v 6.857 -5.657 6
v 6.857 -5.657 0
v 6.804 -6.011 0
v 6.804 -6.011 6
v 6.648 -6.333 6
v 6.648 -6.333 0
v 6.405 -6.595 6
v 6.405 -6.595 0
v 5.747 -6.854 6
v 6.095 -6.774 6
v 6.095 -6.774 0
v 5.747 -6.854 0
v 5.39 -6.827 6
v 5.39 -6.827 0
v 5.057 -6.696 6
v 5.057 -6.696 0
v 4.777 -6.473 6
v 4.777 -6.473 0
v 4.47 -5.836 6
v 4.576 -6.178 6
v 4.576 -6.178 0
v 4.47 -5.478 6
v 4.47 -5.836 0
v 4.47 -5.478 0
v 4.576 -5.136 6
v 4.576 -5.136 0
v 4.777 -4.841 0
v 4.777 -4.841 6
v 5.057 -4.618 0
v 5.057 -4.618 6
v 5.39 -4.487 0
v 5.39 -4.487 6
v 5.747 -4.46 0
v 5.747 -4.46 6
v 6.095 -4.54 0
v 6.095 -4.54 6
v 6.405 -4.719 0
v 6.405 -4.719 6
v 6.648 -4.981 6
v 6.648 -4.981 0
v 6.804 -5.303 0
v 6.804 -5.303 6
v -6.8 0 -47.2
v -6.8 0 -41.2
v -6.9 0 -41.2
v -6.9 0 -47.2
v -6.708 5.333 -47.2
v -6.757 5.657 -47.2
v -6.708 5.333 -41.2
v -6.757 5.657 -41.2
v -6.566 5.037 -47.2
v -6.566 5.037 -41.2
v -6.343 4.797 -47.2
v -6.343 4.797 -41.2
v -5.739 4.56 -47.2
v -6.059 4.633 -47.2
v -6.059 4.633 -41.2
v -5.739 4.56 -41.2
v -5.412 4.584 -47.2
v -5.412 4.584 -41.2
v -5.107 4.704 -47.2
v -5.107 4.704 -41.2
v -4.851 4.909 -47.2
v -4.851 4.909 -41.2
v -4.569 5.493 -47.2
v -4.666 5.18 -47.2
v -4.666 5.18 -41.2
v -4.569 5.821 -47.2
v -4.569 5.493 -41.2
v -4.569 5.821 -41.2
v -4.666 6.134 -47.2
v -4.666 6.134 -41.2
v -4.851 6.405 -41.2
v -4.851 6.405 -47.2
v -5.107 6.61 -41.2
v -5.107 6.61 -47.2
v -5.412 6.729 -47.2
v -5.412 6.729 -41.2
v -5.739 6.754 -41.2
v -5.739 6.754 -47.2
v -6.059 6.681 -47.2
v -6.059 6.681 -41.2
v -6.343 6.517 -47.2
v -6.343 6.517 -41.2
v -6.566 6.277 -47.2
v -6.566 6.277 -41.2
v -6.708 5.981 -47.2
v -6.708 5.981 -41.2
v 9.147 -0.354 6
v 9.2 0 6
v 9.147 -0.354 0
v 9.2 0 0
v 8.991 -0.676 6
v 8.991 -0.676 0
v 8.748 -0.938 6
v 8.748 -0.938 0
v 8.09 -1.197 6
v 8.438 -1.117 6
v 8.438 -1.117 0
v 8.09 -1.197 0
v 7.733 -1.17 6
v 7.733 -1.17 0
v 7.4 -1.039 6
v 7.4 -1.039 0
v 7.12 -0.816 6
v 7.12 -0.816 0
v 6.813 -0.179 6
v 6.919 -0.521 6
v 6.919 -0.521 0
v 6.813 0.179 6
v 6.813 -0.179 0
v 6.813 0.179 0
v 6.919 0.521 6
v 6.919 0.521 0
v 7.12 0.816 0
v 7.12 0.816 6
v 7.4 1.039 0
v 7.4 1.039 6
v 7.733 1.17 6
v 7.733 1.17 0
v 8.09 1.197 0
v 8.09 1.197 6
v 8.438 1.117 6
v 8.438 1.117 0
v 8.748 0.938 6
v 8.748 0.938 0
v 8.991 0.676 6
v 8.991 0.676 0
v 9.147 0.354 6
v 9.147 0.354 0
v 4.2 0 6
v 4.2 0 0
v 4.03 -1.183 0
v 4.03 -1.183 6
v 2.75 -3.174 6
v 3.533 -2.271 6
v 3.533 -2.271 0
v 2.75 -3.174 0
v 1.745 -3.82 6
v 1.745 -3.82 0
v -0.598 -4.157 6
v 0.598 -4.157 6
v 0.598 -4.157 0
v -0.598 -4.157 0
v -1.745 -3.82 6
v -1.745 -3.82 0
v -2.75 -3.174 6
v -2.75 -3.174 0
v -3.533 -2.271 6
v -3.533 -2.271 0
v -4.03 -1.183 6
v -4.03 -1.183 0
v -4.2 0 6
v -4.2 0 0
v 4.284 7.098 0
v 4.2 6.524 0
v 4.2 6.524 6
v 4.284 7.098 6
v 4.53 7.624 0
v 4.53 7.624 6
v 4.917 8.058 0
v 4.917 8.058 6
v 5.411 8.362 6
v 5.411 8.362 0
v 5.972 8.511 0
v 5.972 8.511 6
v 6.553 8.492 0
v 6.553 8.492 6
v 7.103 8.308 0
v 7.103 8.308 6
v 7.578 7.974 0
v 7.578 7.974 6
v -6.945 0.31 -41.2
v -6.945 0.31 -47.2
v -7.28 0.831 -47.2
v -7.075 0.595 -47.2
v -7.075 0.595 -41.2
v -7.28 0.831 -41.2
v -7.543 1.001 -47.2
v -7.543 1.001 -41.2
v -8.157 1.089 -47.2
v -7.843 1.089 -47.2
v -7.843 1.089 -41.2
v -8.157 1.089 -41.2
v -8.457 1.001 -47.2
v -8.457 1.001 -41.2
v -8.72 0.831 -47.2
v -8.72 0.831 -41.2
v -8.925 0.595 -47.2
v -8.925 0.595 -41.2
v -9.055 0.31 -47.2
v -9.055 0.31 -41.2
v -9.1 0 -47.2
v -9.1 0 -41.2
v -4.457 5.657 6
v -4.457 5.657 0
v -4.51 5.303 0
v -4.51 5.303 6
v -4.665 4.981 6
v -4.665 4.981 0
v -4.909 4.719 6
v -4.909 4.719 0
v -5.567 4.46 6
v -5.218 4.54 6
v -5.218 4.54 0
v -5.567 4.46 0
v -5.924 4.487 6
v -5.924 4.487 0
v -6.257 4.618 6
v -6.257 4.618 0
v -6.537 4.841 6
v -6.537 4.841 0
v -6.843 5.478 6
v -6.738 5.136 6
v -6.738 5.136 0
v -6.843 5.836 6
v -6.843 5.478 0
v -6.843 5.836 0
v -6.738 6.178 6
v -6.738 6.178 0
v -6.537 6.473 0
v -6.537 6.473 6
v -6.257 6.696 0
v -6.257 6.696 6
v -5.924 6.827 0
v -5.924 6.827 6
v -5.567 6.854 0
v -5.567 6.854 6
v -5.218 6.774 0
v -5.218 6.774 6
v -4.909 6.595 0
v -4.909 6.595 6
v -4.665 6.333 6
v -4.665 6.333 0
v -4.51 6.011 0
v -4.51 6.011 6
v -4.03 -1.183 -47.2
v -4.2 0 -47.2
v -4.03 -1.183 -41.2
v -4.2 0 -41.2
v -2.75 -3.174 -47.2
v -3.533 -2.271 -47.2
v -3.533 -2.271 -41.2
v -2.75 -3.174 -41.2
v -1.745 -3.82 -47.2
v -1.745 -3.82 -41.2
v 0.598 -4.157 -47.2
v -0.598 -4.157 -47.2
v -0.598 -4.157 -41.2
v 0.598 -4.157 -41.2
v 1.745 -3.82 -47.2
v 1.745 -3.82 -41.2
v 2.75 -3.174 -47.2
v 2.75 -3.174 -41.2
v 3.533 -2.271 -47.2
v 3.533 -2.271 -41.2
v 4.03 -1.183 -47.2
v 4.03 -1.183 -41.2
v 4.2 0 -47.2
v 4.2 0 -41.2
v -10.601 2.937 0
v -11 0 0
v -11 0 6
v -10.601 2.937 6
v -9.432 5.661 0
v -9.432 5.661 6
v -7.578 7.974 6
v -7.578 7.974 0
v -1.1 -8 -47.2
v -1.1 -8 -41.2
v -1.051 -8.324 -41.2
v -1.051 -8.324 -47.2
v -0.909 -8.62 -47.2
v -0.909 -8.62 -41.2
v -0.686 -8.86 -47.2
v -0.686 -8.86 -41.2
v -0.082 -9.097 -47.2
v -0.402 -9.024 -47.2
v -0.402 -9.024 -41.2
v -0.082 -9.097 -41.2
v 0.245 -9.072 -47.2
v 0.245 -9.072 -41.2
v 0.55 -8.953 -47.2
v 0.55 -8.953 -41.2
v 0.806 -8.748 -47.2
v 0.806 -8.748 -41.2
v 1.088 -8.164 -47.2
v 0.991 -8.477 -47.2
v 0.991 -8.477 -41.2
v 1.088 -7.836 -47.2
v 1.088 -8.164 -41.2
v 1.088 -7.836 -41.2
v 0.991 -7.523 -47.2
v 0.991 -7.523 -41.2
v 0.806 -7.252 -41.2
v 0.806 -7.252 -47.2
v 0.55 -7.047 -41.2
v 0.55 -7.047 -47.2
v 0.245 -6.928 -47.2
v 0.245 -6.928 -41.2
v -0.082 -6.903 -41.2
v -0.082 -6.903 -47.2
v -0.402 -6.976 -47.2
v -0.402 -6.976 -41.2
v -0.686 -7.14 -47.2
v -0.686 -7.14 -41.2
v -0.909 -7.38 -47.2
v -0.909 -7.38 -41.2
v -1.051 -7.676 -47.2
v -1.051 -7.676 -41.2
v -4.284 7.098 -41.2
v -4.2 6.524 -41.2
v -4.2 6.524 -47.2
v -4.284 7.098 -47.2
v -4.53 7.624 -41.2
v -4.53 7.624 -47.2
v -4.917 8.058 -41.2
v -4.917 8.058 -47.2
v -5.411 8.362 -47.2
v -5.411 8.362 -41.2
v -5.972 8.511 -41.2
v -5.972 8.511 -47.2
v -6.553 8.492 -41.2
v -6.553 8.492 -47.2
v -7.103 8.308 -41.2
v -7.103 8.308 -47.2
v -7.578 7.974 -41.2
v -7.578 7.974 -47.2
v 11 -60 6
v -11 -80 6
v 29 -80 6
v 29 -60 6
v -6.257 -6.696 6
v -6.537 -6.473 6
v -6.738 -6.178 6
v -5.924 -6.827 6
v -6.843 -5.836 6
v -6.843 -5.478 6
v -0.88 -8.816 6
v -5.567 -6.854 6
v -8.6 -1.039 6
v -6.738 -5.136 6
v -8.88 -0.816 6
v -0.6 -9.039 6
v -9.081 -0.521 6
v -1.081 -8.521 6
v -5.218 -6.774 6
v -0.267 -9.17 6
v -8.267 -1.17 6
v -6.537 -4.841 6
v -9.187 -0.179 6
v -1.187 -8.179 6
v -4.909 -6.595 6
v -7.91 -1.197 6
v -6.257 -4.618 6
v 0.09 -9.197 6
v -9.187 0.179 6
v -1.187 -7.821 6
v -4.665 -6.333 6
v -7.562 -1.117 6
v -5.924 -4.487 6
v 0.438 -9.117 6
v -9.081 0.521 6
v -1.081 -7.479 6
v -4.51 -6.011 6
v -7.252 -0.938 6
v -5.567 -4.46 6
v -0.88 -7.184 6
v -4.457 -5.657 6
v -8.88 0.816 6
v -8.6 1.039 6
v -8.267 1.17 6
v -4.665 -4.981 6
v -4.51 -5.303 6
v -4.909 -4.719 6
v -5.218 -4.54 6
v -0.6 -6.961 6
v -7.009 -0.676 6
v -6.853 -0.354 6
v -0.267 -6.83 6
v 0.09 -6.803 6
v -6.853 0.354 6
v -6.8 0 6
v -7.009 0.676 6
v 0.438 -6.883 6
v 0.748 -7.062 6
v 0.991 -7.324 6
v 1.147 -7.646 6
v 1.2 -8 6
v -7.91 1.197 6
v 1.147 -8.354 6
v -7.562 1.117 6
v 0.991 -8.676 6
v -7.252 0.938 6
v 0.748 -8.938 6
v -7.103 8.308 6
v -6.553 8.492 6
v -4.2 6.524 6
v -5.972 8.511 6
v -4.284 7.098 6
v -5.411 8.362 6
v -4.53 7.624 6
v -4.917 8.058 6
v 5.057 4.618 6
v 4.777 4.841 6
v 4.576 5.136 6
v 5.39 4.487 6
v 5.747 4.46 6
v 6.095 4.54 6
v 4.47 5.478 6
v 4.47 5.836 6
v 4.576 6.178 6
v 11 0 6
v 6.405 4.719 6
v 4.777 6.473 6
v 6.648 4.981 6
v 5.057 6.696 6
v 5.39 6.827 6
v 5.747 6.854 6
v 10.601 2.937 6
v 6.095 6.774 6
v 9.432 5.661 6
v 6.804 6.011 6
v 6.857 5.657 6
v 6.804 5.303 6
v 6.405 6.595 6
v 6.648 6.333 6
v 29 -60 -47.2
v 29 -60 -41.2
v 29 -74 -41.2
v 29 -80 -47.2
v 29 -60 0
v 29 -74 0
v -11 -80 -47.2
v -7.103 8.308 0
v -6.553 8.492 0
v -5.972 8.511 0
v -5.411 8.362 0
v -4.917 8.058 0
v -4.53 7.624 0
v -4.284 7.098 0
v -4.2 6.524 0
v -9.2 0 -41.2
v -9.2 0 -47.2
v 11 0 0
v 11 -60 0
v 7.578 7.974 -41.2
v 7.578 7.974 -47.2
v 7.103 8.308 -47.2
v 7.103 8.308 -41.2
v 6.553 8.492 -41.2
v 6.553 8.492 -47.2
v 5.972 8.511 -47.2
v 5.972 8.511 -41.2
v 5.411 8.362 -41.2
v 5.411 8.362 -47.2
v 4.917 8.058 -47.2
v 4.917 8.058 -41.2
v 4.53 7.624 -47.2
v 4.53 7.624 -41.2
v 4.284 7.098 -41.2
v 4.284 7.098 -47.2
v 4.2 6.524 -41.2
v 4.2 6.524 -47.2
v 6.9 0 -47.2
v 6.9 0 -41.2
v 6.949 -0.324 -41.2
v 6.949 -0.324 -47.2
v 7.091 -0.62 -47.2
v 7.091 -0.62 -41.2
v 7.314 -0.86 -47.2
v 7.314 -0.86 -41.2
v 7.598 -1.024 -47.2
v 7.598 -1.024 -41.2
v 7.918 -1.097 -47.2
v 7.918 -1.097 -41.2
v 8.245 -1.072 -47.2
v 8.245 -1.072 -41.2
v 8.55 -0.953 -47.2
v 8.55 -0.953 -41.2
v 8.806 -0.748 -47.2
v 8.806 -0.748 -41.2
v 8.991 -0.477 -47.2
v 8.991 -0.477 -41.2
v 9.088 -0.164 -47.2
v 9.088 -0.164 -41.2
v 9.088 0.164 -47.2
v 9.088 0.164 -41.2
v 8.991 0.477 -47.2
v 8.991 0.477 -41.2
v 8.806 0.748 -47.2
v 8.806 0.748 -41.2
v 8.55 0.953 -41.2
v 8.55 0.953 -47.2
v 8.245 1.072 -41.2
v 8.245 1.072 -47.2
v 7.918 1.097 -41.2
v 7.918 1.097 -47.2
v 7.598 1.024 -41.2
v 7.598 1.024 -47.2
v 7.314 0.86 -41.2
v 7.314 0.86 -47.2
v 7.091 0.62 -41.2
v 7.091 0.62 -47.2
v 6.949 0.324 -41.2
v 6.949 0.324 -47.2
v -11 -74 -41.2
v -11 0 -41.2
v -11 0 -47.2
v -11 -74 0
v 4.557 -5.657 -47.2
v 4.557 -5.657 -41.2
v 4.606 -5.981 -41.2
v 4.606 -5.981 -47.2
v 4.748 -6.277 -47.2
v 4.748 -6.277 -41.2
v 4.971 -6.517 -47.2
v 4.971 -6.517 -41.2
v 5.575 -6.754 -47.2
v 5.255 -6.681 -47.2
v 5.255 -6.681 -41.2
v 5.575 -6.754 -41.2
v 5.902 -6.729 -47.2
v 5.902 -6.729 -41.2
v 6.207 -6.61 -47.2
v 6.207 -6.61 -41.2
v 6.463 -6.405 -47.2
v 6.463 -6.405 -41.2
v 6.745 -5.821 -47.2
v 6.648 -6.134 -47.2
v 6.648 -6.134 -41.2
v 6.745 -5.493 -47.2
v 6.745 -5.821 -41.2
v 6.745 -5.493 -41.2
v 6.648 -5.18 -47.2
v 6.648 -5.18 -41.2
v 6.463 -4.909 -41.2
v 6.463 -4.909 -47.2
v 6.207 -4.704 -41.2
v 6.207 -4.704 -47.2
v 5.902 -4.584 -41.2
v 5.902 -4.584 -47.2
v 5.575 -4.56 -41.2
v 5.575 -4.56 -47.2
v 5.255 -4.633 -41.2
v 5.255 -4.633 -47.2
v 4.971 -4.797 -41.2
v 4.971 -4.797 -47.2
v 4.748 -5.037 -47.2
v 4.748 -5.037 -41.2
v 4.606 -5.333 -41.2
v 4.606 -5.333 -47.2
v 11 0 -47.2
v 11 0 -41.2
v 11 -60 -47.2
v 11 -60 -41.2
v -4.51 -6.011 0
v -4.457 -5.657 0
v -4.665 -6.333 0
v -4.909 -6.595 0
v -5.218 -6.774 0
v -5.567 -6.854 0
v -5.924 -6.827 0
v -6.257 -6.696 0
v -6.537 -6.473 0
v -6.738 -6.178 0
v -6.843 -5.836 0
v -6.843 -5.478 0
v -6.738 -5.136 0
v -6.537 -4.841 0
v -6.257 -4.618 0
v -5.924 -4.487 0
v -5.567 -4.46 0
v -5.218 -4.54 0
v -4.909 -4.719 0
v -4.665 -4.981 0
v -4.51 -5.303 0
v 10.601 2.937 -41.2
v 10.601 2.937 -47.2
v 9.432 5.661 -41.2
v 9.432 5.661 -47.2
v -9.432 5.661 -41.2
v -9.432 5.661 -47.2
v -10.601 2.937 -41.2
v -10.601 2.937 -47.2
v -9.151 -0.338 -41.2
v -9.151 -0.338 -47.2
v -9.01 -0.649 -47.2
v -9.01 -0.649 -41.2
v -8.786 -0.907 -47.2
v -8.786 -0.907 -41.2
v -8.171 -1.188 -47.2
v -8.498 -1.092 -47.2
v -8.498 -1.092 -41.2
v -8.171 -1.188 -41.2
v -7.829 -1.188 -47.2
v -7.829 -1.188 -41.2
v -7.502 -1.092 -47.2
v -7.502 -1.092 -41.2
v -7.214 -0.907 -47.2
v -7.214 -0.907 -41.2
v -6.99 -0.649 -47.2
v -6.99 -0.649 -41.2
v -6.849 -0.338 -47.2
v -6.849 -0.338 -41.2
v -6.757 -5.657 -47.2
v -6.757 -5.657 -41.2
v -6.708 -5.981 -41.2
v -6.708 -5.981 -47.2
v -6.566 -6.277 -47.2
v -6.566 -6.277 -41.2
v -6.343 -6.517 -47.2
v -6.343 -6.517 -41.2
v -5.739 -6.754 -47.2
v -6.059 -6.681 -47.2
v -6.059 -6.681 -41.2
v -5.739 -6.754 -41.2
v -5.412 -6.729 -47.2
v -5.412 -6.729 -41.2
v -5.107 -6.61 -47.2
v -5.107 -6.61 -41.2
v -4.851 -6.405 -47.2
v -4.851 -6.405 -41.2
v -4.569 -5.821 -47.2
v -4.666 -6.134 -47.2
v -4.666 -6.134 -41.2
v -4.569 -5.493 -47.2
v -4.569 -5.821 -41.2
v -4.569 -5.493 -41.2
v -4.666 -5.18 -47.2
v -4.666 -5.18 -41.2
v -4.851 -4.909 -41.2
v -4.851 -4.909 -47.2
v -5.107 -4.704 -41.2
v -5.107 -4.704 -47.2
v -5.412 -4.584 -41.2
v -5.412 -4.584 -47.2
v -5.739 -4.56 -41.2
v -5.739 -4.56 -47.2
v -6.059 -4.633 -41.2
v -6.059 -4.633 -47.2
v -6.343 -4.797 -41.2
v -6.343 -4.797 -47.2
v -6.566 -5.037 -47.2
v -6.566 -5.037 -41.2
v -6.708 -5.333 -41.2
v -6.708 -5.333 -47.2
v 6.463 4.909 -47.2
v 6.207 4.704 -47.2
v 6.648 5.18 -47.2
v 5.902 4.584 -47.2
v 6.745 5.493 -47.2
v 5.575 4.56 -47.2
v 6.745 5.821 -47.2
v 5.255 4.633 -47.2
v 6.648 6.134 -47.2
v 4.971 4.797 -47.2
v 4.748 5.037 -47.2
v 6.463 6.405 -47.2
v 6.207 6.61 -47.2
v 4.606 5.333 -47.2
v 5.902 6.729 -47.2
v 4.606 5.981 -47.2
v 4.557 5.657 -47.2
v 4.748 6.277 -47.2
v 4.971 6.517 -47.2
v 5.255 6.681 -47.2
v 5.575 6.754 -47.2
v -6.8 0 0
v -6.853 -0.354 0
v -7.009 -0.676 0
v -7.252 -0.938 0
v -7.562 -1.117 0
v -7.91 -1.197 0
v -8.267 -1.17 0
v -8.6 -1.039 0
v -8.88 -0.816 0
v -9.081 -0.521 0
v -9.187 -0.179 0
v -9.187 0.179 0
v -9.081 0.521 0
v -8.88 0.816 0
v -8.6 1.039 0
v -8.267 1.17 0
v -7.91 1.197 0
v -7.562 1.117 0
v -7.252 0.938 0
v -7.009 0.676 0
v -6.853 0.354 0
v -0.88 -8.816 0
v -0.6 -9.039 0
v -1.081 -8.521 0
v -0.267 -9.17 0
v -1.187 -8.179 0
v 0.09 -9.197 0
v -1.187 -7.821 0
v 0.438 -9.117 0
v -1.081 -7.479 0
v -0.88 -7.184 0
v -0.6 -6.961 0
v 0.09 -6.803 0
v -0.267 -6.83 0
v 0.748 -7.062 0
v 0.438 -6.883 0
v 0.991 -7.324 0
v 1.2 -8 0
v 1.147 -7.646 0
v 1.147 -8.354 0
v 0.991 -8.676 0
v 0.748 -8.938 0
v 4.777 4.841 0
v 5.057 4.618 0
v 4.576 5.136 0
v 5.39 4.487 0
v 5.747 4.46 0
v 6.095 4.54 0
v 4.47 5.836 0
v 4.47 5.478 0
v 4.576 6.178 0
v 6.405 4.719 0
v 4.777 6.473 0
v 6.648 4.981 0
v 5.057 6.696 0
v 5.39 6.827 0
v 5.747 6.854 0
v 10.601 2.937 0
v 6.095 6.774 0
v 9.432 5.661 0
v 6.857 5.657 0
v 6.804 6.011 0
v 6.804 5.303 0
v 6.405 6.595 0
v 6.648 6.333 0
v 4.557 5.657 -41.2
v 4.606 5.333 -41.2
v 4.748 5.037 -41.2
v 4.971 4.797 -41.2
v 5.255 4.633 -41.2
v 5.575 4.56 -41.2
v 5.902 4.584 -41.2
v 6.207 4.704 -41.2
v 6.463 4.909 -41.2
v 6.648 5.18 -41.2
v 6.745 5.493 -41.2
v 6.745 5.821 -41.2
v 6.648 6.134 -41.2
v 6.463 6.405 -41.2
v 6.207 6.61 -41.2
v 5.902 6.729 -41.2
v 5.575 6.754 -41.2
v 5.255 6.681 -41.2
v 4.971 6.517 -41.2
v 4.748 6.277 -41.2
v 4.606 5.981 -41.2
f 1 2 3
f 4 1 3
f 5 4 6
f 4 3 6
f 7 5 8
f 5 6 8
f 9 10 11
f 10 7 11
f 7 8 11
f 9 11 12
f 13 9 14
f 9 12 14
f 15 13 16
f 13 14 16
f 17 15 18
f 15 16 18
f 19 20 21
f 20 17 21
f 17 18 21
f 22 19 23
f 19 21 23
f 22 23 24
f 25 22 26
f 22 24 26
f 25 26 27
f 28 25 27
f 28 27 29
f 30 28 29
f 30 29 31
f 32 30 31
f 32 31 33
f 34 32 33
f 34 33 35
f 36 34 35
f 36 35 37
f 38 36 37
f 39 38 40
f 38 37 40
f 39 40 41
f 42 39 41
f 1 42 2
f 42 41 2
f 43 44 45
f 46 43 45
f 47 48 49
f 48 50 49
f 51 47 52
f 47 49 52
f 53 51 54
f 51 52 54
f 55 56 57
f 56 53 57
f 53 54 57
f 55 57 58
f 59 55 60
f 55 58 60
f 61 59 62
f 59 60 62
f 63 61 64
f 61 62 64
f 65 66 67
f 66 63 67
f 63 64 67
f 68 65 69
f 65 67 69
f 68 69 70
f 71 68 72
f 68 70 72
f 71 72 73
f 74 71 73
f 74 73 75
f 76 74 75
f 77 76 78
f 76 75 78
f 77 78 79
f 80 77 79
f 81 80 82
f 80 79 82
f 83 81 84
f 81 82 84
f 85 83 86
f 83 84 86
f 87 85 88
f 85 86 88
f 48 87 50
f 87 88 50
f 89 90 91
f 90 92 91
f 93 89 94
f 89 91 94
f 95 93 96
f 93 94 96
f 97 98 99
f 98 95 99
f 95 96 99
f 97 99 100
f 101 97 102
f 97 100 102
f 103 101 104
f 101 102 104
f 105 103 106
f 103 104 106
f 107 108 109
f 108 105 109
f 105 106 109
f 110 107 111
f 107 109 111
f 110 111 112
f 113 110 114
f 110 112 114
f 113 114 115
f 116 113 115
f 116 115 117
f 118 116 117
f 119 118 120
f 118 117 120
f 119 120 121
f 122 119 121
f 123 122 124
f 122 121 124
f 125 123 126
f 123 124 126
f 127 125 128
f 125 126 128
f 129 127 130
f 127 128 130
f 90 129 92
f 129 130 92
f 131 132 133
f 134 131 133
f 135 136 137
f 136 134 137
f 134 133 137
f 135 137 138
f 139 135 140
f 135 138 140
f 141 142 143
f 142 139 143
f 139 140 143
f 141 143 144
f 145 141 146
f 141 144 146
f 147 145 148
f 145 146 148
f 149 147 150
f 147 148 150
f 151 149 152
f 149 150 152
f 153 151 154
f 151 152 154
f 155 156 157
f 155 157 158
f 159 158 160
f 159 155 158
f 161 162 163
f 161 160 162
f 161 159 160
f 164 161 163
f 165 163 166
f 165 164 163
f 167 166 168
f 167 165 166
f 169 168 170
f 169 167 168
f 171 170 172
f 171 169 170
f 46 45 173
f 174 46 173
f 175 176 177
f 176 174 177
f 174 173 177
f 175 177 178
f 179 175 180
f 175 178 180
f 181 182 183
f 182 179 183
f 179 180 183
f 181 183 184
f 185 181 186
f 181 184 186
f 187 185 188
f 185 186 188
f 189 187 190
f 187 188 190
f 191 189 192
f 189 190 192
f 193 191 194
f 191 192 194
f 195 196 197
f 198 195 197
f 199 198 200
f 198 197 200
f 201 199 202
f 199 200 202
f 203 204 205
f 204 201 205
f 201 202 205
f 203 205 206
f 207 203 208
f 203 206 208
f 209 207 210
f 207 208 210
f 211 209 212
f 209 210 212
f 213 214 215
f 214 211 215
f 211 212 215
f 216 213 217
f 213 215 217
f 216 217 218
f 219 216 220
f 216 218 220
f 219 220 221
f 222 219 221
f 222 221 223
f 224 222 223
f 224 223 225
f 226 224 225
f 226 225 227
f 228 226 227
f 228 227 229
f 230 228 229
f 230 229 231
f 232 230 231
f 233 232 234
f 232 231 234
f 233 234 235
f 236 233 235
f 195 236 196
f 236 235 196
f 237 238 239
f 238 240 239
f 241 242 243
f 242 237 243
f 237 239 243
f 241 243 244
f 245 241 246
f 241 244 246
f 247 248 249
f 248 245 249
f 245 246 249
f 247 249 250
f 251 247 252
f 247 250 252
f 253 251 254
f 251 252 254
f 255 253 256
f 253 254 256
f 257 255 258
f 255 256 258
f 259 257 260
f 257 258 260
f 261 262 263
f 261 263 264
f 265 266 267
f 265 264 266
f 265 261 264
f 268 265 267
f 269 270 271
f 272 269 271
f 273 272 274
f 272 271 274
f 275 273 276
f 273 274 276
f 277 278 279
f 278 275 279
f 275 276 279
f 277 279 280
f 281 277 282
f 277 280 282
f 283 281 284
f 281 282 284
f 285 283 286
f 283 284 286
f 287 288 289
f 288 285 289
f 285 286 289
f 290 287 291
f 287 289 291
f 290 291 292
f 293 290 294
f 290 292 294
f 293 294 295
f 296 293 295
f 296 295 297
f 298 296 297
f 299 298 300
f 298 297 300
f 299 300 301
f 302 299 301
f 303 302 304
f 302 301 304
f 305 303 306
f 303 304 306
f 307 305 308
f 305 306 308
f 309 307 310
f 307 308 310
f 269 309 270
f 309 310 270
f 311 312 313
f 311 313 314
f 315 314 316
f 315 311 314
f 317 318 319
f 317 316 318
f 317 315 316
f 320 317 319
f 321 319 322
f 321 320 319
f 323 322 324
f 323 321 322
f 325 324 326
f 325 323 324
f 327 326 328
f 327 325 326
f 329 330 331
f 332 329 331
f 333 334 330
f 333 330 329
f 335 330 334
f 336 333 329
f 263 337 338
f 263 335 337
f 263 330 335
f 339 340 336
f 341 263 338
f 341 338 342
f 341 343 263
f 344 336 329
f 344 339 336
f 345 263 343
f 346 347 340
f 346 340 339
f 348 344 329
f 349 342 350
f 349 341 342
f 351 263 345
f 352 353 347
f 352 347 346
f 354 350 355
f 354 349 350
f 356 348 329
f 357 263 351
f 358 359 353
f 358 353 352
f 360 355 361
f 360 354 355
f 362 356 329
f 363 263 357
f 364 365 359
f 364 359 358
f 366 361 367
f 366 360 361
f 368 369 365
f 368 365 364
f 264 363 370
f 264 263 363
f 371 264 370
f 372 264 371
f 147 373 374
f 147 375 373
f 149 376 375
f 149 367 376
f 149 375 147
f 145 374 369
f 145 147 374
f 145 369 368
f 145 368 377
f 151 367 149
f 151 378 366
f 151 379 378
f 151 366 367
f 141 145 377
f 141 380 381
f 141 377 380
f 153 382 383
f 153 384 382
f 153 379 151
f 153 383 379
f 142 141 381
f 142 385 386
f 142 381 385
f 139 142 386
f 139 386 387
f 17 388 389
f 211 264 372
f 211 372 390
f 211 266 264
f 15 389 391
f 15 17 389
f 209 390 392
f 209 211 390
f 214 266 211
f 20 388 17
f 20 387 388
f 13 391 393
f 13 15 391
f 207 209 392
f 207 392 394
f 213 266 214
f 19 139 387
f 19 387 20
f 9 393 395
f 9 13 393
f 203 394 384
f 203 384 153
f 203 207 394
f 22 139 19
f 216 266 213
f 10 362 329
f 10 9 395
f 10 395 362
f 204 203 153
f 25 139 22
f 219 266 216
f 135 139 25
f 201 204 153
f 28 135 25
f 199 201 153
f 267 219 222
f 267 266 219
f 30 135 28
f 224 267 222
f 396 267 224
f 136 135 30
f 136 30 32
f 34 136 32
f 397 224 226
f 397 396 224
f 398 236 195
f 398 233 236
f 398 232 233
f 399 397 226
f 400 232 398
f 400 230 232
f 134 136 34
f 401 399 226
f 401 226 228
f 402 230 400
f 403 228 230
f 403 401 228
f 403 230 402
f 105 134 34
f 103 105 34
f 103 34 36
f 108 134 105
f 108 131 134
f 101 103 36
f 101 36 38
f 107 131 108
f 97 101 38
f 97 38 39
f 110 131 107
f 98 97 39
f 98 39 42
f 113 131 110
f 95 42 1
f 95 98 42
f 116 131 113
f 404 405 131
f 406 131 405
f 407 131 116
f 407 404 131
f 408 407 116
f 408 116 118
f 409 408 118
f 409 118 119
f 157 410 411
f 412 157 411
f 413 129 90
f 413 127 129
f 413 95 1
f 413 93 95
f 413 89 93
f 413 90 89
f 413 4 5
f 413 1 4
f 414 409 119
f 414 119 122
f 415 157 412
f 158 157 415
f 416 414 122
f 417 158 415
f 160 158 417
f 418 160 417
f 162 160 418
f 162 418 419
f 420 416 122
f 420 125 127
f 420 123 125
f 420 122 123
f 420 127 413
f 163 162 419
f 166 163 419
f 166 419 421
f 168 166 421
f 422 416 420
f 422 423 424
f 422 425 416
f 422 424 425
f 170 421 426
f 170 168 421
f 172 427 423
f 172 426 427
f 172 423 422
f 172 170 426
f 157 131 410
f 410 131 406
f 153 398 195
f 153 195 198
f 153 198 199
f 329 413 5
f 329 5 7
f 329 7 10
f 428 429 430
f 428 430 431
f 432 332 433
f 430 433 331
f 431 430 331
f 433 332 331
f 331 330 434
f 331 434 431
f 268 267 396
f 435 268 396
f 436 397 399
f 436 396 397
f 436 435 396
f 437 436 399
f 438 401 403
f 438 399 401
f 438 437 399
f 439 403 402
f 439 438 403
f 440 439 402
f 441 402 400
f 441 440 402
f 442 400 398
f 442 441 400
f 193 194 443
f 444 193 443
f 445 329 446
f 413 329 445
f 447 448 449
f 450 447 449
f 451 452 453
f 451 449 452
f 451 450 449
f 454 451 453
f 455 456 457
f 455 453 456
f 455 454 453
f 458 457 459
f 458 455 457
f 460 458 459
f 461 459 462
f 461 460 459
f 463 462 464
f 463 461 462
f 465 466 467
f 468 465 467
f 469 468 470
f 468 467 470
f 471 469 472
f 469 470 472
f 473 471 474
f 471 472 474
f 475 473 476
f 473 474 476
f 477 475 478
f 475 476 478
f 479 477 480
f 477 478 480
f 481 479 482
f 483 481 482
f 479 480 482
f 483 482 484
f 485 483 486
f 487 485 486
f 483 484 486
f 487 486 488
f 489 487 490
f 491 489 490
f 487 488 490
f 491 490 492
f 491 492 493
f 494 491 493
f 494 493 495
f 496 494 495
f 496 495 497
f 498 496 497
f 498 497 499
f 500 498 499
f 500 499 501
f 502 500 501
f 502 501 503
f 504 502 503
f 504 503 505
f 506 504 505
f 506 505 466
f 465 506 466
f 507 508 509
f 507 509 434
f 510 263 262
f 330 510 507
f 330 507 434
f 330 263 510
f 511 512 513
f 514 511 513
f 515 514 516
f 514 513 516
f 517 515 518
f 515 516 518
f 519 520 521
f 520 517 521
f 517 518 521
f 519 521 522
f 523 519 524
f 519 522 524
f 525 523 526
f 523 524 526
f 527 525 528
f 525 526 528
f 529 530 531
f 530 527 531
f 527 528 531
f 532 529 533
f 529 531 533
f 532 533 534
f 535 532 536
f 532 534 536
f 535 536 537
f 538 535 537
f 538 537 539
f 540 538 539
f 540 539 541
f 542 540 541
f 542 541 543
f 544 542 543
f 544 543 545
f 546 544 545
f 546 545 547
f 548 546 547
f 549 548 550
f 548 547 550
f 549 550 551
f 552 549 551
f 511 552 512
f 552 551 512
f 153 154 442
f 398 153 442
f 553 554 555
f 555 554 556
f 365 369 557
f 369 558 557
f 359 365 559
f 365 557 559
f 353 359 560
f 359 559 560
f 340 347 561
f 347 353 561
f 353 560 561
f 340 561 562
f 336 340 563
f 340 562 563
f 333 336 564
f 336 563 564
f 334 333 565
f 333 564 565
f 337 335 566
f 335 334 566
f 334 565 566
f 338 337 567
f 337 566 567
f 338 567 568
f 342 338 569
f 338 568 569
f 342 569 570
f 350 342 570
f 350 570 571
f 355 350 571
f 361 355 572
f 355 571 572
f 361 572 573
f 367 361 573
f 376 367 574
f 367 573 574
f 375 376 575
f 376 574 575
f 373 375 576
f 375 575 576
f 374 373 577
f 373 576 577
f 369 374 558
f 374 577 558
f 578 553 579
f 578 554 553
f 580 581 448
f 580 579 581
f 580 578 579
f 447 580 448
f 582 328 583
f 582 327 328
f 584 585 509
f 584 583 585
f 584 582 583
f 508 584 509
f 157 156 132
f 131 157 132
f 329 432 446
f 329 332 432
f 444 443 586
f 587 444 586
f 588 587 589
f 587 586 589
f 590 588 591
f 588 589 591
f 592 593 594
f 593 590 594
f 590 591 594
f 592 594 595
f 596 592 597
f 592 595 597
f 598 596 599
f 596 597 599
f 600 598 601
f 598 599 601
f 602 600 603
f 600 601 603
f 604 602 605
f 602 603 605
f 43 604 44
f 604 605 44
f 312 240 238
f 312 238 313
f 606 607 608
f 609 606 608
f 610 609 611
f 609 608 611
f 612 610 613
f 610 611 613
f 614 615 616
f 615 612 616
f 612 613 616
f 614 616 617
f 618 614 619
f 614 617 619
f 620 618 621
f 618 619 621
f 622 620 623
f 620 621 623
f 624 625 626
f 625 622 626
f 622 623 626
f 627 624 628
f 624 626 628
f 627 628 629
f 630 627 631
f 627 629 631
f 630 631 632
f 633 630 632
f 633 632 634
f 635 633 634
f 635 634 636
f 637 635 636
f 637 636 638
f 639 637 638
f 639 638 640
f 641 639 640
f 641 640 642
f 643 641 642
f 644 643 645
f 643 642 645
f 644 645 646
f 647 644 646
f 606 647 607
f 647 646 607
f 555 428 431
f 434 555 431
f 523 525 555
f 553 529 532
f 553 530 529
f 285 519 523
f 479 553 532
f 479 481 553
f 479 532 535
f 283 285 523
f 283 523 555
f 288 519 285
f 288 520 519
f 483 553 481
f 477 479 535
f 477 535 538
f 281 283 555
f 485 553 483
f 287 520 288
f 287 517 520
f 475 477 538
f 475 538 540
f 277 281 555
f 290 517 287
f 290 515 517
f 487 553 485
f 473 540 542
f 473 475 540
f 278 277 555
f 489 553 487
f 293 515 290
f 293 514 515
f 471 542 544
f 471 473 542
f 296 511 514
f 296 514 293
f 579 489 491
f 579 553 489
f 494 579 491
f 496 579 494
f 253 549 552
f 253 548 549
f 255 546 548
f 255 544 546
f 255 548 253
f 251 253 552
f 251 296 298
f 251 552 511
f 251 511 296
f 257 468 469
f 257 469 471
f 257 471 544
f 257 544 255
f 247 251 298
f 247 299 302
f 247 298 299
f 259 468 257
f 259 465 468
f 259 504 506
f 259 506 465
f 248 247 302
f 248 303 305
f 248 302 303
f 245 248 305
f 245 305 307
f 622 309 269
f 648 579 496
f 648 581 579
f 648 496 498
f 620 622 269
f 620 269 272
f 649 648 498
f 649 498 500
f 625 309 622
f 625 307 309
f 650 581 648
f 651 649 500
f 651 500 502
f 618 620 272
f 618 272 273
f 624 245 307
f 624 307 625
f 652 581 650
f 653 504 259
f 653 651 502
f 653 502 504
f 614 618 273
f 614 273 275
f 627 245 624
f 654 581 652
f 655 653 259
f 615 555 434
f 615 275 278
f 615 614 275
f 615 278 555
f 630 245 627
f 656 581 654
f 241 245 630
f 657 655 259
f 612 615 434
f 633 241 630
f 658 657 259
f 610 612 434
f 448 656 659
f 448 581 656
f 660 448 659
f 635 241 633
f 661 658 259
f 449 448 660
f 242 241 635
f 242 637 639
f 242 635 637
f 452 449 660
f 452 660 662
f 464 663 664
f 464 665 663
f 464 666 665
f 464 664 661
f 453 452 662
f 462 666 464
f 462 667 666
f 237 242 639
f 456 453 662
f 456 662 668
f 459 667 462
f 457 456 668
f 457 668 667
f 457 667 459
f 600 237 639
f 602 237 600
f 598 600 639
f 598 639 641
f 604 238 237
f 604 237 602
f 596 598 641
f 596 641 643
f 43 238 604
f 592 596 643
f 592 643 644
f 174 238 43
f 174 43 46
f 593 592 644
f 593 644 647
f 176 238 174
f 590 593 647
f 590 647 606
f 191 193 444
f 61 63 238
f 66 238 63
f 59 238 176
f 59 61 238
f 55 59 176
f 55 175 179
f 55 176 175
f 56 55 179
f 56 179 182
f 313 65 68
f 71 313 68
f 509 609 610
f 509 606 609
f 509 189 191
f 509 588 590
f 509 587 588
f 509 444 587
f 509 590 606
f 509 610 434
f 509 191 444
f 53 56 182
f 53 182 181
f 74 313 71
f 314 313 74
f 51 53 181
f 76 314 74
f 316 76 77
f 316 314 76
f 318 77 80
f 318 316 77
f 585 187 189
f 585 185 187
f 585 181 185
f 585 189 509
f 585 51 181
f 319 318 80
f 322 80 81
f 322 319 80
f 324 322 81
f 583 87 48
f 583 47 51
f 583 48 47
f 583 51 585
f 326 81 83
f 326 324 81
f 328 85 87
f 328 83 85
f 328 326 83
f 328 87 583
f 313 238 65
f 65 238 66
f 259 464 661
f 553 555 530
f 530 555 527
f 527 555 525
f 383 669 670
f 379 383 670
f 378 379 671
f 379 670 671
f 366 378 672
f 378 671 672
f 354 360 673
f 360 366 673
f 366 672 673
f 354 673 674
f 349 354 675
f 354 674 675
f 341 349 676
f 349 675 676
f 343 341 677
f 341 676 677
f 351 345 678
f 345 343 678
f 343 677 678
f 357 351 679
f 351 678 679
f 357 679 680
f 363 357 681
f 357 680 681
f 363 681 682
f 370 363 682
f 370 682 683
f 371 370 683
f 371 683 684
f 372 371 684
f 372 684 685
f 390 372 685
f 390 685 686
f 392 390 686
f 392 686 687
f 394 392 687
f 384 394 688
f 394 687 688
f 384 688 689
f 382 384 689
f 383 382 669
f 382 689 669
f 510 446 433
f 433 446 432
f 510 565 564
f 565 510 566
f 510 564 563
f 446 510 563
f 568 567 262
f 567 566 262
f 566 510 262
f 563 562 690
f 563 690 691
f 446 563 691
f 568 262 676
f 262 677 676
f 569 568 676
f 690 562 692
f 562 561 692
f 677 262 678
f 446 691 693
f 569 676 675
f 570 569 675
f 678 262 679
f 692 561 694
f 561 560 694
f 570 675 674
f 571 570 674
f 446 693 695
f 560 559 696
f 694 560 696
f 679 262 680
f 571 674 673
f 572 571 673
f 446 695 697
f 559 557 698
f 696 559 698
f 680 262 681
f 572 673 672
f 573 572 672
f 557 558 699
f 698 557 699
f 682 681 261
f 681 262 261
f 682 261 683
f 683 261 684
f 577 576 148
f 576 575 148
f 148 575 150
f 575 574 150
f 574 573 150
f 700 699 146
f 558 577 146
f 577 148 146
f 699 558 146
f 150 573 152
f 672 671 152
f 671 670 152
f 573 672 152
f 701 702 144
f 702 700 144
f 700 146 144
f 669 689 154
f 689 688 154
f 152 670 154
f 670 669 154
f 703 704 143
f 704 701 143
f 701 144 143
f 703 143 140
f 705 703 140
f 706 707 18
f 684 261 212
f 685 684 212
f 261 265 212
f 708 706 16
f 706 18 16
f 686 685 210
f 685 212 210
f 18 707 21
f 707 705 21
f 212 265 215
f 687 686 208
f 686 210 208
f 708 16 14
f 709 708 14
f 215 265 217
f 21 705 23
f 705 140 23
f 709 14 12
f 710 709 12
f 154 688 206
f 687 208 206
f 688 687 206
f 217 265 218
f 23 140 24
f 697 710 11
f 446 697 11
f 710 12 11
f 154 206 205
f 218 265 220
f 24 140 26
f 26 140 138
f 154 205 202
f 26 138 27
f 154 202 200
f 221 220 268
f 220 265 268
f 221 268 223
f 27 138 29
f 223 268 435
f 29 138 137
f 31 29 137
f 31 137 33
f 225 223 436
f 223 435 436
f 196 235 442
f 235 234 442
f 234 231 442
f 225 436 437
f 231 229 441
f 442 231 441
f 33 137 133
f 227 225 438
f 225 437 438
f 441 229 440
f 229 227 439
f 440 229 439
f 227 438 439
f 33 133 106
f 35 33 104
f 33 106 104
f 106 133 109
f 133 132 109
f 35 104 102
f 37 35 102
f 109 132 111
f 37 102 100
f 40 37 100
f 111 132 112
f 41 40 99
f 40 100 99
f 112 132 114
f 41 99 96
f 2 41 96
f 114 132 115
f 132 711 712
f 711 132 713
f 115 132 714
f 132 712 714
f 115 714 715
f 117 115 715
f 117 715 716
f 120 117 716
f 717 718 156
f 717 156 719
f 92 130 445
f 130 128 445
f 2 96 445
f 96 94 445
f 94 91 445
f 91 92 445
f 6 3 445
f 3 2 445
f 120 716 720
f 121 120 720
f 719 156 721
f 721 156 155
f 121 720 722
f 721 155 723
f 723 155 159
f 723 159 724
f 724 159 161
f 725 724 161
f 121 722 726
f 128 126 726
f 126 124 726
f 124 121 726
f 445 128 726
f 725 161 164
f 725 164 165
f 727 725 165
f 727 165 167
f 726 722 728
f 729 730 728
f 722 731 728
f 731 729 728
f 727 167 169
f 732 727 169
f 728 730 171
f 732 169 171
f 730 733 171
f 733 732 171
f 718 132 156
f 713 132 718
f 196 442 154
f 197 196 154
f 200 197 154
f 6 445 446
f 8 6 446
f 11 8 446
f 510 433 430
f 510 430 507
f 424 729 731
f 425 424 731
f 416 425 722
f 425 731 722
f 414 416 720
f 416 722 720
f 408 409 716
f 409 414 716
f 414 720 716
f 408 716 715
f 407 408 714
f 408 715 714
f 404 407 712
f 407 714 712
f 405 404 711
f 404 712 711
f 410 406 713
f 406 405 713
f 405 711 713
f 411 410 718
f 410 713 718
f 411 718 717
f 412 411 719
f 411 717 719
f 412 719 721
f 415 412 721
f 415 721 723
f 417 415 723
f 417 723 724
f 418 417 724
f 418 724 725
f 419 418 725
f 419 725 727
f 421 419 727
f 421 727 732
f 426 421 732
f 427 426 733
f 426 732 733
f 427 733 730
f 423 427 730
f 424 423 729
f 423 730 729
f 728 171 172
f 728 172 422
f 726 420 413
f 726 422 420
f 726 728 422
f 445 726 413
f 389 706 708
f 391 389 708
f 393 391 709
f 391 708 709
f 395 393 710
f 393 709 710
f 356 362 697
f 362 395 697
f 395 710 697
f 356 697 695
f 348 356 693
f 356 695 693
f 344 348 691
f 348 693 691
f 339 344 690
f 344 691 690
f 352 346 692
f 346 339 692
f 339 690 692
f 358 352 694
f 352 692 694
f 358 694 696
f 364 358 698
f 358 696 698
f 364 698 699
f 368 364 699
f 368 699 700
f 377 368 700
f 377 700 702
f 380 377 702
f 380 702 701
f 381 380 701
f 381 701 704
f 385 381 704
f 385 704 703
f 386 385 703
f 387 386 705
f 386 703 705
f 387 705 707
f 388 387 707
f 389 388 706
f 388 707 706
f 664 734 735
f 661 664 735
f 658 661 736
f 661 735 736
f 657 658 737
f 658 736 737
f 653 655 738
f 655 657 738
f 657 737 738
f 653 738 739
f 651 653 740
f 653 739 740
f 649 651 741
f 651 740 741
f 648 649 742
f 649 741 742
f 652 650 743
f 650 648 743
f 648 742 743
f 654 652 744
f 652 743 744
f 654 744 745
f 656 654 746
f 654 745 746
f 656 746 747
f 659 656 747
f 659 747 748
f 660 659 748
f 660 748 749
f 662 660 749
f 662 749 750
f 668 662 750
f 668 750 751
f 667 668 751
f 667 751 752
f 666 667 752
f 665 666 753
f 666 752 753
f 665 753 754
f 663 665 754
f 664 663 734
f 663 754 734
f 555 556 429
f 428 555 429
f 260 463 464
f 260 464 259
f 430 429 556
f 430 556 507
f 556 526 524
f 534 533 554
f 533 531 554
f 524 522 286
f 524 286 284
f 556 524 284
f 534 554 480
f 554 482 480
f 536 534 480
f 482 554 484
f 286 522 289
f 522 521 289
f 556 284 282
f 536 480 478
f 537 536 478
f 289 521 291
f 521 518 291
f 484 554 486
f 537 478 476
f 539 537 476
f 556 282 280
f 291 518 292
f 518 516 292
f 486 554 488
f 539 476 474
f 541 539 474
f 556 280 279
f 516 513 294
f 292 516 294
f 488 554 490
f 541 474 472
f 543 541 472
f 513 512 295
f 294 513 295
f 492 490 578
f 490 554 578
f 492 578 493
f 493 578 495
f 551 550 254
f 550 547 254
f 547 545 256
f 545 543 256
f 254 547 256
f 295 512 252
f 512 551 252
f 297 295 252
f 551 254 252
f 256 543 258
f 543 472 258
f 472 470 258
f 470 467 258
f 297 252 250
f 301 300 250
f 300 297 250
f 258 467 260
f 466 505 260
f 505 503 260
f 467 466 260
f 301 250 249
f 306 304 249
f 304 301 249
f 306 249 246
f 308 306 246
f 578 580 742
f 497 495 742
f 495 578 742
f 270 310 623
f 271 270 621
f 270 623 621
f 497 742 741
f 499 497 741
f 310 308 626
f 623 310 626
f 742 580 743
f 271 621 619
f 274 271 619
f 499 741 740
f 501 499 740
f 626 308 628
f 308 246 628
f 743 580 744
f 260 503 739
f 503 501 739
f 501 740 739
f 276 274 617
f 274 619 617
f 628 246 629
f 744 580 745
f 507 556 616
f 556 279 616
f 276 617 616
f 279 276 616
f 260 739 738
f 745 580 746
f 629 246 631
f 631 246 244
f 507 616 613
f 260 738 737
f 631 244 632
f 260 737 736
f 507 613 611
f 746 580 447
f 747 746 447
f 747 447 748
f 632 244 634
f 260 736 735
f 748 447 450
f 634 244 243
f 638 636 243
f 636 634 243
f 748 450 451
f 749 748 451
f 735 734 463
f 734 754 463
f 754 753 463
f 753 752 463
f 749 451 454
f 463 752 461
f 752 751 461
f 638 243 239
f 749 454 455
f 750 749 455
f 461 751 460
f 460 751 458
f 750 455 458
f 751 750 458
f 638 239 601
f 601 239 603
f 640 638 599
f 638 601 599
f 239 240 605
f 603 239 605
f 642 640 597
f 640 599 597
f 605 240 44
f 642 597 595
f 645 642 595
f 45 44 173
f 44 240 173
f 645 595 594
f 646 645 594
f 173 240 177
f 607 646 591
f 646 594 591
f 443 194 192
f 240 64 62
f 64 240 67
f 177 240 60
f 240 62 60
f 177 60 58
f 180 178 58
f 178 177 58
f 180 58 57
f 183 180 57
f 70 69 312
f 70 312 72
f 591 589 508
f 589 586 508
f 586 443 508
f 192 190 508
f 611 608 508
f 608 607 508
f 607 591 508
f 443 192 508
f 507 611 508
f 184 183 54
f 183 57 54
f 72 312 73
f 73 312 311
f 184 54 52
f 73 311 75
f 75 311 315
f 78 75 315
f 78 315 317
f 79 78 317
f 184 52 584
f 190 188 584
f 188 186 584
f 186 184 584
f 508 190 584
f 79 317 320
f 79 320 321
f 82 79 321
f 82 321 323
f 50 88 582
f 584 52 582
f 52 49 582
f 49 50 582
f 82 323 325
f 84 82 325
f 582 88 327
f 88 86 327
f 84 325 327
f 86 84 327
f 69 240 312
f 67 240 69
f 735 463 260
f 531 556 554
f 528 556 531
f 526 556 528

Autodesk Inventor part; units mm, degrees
ref_plane "YZ Plane" through (0, 0, 0) normal (1, 0, 0) x (0, 1, 0)
ref_plane "XZ Plane" through (0, 0, 0) normal (0, 1, 0) x (-1, 0, 0)
ref_plane "XY Plane" through (0, 0, 0) normal (0, 0, 1) x (1, 0, 0)
sketch "스케치1" plane through (0, 0, 0) normal (0, 0, 1) x (1, 0, 0)
  circle A0 centre (0, 8) radius 1.05 projected
  line L0 (6.1695, 0) -> (-5.6569, 0)
  circle A1 centre (0, 0) radius 11 projected
  line L1 (11, -20) -> (31, -20) projected
  line L2 (11, 0) -> (11, -20) projected
  arc A2 (11, 0) -> (7.5778, 7.9735) centre (0, 0) ccw projected
  arc A3 (-7.5778, 7.9735) -> (-11, 0) centre (0, 0) ccw projected
  line L3 (-11, -40) -> (-11, 0) projected
  line L4 (31, -40) -> (-11, -40) projected
  line L5 (31, -20) -> (31, -40) projected
  circle A4 centre (5.6569, 5.6569) radius 1.2 projected
  circle A5 centre (-8, 0) radius 1.2 projected
  circle A6 centre (-5.6569, 5.6569) radius 1.2 projected
  circle A7 centre (-5.6569, -5.6569) radius 1.2 projected
  circle A8 centre (5.6569, -5.6569) radius 1.2 projected
  circle A9 centre (0, -8) radius 1.2 projected
  circle A10 centre (8, 0) radius 1.2 projected
  arc A11 (-10.0222, 4.5338) -> (10.0222, 4.5338) centre (0, 0) ccw
  arc A12 (-4.2, 0) -> (4.2, 0) centre (0, 0) ccw
  line L6 (4.2, 0) -> (-4.2, 0)
  line L7 (-4.2, 0) -> (-4.2, 6.5238)
  line L8 (-4.2, 13.5959) -> (4.2, 13.5959)
  line L9 (4.2, 6.5238) -> (4.2, 0)
  arc A13 (-7.5778, 7.9735) -> (7.5778, 7.9735) centre (0, 0) ccw
  arc A14 (7.5778, 7.9735) -> (4.2, 6.5238) centre (6.2, 6.5238) ccw
  arc A15 (-4.2, 6.5238) -> (-7.5778, 7.9735) centre (-6.2, 6.5238) ccw
  point P0 (-6.2, 0)
  point P1 (4.2, 10.1666)
  point P2 (-4.2, 10.1666)
  point P3 (-7.5778, 7.9735)
  point P4 (7.5778, 7.9735)
  dimension "d20" = 2
extrude "돌출1" add sketch "스케치1" along normal blind 6 contours L9 A14 A1 A15 L7 A12
sketch "스케치3" plane through (0, 0, 6) normal (0, 0, 1) x (1, 0, 0)
  line L0 (31, -40) -> (31, -20) projected
  line L1 (11, -20) -> (31, -20)
  line L2 (31, -20) -> (31, -40)
  line L3 (31, -40) -> (11, -40)
  line L4 (11, -40) -> (11, -20)
  arc A0 (-7.5778, 7.9735) -> (7.5778, 7.9735) centre (0, 0) ccw projected
  circle A1 centre (-8, 0) radius 1.2 projected
  circle A2 centre (-5.6569, -5.6569) radius 1.2 projected
  circle A3 centre (5.6569, -5.6569) radius 1.2 projected
  circle A4 centre (0, -8) radius 1.2 projected
  circle A5 centre (8, 0) radius 1.2 projected
  line L5 (11, -40) -> (-11, -40)
  line L6 (-11, -40) -> (-11, -80)
  line L7 (-11, -80) -> (11, -80)
  line L8 (11, -80) -> (11, -40)
  line L9 (-11, -80) -> (29, -80)
  line L10 (29, -80) -> (29, -60)
  line L11 (29, -60) -> (-11, -60)
  line L12 (-11, -60) -> (-11, -80)
  line L13 (-11, -40) -> (11, -40)
  line L14 (11, -40) -> (11, 0)
  line L15 (11, 0) -> (-11, 0)
  line L16 (-11, 0) -> (-11, -40)
  arc A6 (7.5778, 7.9735) -> (4.2, 6.5238) centre (6.2, 6.5238) ccw projected
  line L17 (4.2, 6.5238) -> (4.2, 0) projected
  arc A7 (-4.2, 0) -> (4.2, 0) centre (0, 0) ccw projected
  line L18 (-4.2, 0) -> (-4.2, 6.5238) projected
  arc A8 (-4.2, 6.5238) -> (-7.5778, 7.9735) centre (-6.2, 6.5238) ccw projected
  point P0 (11, -60)
  dimension "d4" = 40
extrude "돌출2" add sketch "스케치3" against normal blind 6 contours L5 L16 A0 L14 L4 | L8 L11 L6 L5 | L11 L10 L9 L8 | L8 L7 L6 L11
sketch "스케치4" plane through (0, 0, 0) normal (0, 0, -1) x (-1, 0, 0)
  line L0 (11, 0) -> (11, -80) projected
  line L1 (-29, -60) -> (-29, -80) projected
  line L2 (11, -80) -> (-29, -80)
  line L3 (-29, -80) -> (-29, -60)
  line L4 (-29, -60) -> (11, -60)
  line L5 (11, -60) -> (11, -80)
  line L6 (11, -80) -> (-29, -80)
  line L7 (-29, -80) -> (-29, -74)
  line L8 (-29, -74) -> (11, -74)
  line L9 (11, -74) -> (11, -80)
  point P0 (0, 0)
  dimension "d7" = 6
extrude "돌출3" add sketch "스케치4" along normal blind 41.2 contours L0 L2 L1 L8
sketch "스케치5" plane through (0, 0, -41.2) normal (0, 0, -1) x (-1, 0, 0)
  circle A0 centre (0, 0) radius 11 projected
  circle A1 centre (5.6569, -5.6569) radius 1.15
  circle A2 centre (8, 0) radius 1.15
  circle A3 centre (5.6569, 5.6569) radius 1.15
  circle A4 centre (0, 8) radius 1.15
  circle A5 centre (-5.6569, 5.6569) radius 1.15
  circle A6 centre (-8, 0) radius 1.15
  circle A7 centre (-5.6569, -5.6569) radius 1.15
  circle A8 centre (0, -8) radius 1.15
  line L0 (-11, 0) -> (-11, -60) projected
  line L1 (11, 0) -> (11, -80) projected
  line L2 (-11, 0) -> (11, 0)
  line L3 (11, 0) -> (11, -80)
  line L4 (11, -80) -> (-11, -80)
  line L5 (-11, -80) -> (-11, 0)
  line L6 (-29, -80) -> (-29, -60) projected
  line L7 (-29, -80) -> (-11, -80)
  line L8 (-11, -80) -> (-11, -60)
  line L9 (-11, -60) -> (-29, -60)
  line L10 (-29, -60) -> (-29, -80)
  line L11 (6.2, 0) -> (-6.2, 0)
  line L12 (-6.2, 15) -> (6.2, 15)
  arc A9 (-10.0222, 4.5338) -> (10.0222, 4.5338) centre (0, 0) ccw
  arc A10 (11, 0) -> (7.5778, 7.9735) centre (0, 0) ccw projected
  line L13 (11, 0) -> (11, -80) projected
  line L14 (11, -80) -> (-29, -80) projected
  line L15 (-29, -80) -> (-29, -60) projected
  line L16 (-29, -60) -> (-11, -60) projected
  line L17 (-11, -60) -> (-11, 0) projected
  arc A11 (-7.5778, 7.9735) -> (-11, 0) centre (0, 0) ccw projected
  arc A12 (-4.2, 6.5238) -> (-7.5778, 7.9735) centre (-6.2, 6.5238) ccw projected
  line L18 (-4.2, 6.5238) -> (-4.2, 0) projected
  arc A13 (-4.2, 0) -> (4.2, 0) centre (0, 0) ccw projected
  line L19 (4.2, 0) -> (4.2, 6.5238) projected
  arc A14 (7.5778, 7.9735) -> (4.2, 6.5238) centre (6.2, 6.5238) ccw projected
  circle A15 centre (-8, 0) radius 1.2 projected
  circle A16 centre (0, -8) radius 1.2 projected
  circle A17 centre (-5.6569, -5.6569) radius 1.2 projected
  circle A18 centre (5.6569, -5.6569) radius 1.2 projected
  circle A19 centre (5.6569, 5.6569) radius 1.2 projected
  circle A20 centre (8, 0) radius 1.2 projected
  circle A21 centre (-5.6569, 5.6569) radius 1.2 projected
  circle A22 centre (5.6569, 5.6569) radius 1.1
  circle A23 centre (0, 8) radius 1.1
  circle A24 centre (-5.6569, 5.6569) radius 1.1
  circle A25 centre (-8, 0) radius 1.1
  circle A26 centre (-5.6569, -5.6569) radius 1.1
  circle A27 centre (0, -8) radius 1.1
  circle A28 centre (5.6569, -5.6569) radius 1.1
  circle A29 centre (8, 0) radius 1.1
  point P0 (0, 0)
  point P1 (6.2, 9.0863)
  point P2 (-6.2, 9.0863)
  point P3 (11, 0)
  point P4 (9.2, 0)
  point P5 (6.8, 0)
  point P6 (6.85, 0)
  point P7 (9.15, 0)
  point P8 (7.5778, 7.9735)
  point P9 (-7.5778, 7.9735)
  point P10 (6.9, 0)
  point P11 (9.1, 0)
  point P12 (-6.9, 0)
  point P13 (-9.1, 0)
  point P14 (-9.15, 0)
  point P15 (-6.85, 0)
  dimension "d13" = 360
  dimension "d21" = 2.2
  dimension "d24" = 360
extrude "돌출4" add sketch "스케치5" along normal blind 6 contours L2 A20 L19 A14 A0 | L1 L4 L5 L0 A0 | A0 L2 A15 A13 A20 | A0 A12 L18 L2 A15 | L2 A2 A20 | L5 L7 L6 L9 | A15 L2 A6 | L2 A6 A15 | L2 A29 A2 | L2 A25 A6 | A6 L2 A25 | A1 | A3 | A5 | A7 | A8 | A16 | A17 | A18 | A19 | A21 picked at (7.9538, 1.1747) picked at (6.8885, 0.1795)
properties part number "부품56" material "PMMA 플라스틱"
